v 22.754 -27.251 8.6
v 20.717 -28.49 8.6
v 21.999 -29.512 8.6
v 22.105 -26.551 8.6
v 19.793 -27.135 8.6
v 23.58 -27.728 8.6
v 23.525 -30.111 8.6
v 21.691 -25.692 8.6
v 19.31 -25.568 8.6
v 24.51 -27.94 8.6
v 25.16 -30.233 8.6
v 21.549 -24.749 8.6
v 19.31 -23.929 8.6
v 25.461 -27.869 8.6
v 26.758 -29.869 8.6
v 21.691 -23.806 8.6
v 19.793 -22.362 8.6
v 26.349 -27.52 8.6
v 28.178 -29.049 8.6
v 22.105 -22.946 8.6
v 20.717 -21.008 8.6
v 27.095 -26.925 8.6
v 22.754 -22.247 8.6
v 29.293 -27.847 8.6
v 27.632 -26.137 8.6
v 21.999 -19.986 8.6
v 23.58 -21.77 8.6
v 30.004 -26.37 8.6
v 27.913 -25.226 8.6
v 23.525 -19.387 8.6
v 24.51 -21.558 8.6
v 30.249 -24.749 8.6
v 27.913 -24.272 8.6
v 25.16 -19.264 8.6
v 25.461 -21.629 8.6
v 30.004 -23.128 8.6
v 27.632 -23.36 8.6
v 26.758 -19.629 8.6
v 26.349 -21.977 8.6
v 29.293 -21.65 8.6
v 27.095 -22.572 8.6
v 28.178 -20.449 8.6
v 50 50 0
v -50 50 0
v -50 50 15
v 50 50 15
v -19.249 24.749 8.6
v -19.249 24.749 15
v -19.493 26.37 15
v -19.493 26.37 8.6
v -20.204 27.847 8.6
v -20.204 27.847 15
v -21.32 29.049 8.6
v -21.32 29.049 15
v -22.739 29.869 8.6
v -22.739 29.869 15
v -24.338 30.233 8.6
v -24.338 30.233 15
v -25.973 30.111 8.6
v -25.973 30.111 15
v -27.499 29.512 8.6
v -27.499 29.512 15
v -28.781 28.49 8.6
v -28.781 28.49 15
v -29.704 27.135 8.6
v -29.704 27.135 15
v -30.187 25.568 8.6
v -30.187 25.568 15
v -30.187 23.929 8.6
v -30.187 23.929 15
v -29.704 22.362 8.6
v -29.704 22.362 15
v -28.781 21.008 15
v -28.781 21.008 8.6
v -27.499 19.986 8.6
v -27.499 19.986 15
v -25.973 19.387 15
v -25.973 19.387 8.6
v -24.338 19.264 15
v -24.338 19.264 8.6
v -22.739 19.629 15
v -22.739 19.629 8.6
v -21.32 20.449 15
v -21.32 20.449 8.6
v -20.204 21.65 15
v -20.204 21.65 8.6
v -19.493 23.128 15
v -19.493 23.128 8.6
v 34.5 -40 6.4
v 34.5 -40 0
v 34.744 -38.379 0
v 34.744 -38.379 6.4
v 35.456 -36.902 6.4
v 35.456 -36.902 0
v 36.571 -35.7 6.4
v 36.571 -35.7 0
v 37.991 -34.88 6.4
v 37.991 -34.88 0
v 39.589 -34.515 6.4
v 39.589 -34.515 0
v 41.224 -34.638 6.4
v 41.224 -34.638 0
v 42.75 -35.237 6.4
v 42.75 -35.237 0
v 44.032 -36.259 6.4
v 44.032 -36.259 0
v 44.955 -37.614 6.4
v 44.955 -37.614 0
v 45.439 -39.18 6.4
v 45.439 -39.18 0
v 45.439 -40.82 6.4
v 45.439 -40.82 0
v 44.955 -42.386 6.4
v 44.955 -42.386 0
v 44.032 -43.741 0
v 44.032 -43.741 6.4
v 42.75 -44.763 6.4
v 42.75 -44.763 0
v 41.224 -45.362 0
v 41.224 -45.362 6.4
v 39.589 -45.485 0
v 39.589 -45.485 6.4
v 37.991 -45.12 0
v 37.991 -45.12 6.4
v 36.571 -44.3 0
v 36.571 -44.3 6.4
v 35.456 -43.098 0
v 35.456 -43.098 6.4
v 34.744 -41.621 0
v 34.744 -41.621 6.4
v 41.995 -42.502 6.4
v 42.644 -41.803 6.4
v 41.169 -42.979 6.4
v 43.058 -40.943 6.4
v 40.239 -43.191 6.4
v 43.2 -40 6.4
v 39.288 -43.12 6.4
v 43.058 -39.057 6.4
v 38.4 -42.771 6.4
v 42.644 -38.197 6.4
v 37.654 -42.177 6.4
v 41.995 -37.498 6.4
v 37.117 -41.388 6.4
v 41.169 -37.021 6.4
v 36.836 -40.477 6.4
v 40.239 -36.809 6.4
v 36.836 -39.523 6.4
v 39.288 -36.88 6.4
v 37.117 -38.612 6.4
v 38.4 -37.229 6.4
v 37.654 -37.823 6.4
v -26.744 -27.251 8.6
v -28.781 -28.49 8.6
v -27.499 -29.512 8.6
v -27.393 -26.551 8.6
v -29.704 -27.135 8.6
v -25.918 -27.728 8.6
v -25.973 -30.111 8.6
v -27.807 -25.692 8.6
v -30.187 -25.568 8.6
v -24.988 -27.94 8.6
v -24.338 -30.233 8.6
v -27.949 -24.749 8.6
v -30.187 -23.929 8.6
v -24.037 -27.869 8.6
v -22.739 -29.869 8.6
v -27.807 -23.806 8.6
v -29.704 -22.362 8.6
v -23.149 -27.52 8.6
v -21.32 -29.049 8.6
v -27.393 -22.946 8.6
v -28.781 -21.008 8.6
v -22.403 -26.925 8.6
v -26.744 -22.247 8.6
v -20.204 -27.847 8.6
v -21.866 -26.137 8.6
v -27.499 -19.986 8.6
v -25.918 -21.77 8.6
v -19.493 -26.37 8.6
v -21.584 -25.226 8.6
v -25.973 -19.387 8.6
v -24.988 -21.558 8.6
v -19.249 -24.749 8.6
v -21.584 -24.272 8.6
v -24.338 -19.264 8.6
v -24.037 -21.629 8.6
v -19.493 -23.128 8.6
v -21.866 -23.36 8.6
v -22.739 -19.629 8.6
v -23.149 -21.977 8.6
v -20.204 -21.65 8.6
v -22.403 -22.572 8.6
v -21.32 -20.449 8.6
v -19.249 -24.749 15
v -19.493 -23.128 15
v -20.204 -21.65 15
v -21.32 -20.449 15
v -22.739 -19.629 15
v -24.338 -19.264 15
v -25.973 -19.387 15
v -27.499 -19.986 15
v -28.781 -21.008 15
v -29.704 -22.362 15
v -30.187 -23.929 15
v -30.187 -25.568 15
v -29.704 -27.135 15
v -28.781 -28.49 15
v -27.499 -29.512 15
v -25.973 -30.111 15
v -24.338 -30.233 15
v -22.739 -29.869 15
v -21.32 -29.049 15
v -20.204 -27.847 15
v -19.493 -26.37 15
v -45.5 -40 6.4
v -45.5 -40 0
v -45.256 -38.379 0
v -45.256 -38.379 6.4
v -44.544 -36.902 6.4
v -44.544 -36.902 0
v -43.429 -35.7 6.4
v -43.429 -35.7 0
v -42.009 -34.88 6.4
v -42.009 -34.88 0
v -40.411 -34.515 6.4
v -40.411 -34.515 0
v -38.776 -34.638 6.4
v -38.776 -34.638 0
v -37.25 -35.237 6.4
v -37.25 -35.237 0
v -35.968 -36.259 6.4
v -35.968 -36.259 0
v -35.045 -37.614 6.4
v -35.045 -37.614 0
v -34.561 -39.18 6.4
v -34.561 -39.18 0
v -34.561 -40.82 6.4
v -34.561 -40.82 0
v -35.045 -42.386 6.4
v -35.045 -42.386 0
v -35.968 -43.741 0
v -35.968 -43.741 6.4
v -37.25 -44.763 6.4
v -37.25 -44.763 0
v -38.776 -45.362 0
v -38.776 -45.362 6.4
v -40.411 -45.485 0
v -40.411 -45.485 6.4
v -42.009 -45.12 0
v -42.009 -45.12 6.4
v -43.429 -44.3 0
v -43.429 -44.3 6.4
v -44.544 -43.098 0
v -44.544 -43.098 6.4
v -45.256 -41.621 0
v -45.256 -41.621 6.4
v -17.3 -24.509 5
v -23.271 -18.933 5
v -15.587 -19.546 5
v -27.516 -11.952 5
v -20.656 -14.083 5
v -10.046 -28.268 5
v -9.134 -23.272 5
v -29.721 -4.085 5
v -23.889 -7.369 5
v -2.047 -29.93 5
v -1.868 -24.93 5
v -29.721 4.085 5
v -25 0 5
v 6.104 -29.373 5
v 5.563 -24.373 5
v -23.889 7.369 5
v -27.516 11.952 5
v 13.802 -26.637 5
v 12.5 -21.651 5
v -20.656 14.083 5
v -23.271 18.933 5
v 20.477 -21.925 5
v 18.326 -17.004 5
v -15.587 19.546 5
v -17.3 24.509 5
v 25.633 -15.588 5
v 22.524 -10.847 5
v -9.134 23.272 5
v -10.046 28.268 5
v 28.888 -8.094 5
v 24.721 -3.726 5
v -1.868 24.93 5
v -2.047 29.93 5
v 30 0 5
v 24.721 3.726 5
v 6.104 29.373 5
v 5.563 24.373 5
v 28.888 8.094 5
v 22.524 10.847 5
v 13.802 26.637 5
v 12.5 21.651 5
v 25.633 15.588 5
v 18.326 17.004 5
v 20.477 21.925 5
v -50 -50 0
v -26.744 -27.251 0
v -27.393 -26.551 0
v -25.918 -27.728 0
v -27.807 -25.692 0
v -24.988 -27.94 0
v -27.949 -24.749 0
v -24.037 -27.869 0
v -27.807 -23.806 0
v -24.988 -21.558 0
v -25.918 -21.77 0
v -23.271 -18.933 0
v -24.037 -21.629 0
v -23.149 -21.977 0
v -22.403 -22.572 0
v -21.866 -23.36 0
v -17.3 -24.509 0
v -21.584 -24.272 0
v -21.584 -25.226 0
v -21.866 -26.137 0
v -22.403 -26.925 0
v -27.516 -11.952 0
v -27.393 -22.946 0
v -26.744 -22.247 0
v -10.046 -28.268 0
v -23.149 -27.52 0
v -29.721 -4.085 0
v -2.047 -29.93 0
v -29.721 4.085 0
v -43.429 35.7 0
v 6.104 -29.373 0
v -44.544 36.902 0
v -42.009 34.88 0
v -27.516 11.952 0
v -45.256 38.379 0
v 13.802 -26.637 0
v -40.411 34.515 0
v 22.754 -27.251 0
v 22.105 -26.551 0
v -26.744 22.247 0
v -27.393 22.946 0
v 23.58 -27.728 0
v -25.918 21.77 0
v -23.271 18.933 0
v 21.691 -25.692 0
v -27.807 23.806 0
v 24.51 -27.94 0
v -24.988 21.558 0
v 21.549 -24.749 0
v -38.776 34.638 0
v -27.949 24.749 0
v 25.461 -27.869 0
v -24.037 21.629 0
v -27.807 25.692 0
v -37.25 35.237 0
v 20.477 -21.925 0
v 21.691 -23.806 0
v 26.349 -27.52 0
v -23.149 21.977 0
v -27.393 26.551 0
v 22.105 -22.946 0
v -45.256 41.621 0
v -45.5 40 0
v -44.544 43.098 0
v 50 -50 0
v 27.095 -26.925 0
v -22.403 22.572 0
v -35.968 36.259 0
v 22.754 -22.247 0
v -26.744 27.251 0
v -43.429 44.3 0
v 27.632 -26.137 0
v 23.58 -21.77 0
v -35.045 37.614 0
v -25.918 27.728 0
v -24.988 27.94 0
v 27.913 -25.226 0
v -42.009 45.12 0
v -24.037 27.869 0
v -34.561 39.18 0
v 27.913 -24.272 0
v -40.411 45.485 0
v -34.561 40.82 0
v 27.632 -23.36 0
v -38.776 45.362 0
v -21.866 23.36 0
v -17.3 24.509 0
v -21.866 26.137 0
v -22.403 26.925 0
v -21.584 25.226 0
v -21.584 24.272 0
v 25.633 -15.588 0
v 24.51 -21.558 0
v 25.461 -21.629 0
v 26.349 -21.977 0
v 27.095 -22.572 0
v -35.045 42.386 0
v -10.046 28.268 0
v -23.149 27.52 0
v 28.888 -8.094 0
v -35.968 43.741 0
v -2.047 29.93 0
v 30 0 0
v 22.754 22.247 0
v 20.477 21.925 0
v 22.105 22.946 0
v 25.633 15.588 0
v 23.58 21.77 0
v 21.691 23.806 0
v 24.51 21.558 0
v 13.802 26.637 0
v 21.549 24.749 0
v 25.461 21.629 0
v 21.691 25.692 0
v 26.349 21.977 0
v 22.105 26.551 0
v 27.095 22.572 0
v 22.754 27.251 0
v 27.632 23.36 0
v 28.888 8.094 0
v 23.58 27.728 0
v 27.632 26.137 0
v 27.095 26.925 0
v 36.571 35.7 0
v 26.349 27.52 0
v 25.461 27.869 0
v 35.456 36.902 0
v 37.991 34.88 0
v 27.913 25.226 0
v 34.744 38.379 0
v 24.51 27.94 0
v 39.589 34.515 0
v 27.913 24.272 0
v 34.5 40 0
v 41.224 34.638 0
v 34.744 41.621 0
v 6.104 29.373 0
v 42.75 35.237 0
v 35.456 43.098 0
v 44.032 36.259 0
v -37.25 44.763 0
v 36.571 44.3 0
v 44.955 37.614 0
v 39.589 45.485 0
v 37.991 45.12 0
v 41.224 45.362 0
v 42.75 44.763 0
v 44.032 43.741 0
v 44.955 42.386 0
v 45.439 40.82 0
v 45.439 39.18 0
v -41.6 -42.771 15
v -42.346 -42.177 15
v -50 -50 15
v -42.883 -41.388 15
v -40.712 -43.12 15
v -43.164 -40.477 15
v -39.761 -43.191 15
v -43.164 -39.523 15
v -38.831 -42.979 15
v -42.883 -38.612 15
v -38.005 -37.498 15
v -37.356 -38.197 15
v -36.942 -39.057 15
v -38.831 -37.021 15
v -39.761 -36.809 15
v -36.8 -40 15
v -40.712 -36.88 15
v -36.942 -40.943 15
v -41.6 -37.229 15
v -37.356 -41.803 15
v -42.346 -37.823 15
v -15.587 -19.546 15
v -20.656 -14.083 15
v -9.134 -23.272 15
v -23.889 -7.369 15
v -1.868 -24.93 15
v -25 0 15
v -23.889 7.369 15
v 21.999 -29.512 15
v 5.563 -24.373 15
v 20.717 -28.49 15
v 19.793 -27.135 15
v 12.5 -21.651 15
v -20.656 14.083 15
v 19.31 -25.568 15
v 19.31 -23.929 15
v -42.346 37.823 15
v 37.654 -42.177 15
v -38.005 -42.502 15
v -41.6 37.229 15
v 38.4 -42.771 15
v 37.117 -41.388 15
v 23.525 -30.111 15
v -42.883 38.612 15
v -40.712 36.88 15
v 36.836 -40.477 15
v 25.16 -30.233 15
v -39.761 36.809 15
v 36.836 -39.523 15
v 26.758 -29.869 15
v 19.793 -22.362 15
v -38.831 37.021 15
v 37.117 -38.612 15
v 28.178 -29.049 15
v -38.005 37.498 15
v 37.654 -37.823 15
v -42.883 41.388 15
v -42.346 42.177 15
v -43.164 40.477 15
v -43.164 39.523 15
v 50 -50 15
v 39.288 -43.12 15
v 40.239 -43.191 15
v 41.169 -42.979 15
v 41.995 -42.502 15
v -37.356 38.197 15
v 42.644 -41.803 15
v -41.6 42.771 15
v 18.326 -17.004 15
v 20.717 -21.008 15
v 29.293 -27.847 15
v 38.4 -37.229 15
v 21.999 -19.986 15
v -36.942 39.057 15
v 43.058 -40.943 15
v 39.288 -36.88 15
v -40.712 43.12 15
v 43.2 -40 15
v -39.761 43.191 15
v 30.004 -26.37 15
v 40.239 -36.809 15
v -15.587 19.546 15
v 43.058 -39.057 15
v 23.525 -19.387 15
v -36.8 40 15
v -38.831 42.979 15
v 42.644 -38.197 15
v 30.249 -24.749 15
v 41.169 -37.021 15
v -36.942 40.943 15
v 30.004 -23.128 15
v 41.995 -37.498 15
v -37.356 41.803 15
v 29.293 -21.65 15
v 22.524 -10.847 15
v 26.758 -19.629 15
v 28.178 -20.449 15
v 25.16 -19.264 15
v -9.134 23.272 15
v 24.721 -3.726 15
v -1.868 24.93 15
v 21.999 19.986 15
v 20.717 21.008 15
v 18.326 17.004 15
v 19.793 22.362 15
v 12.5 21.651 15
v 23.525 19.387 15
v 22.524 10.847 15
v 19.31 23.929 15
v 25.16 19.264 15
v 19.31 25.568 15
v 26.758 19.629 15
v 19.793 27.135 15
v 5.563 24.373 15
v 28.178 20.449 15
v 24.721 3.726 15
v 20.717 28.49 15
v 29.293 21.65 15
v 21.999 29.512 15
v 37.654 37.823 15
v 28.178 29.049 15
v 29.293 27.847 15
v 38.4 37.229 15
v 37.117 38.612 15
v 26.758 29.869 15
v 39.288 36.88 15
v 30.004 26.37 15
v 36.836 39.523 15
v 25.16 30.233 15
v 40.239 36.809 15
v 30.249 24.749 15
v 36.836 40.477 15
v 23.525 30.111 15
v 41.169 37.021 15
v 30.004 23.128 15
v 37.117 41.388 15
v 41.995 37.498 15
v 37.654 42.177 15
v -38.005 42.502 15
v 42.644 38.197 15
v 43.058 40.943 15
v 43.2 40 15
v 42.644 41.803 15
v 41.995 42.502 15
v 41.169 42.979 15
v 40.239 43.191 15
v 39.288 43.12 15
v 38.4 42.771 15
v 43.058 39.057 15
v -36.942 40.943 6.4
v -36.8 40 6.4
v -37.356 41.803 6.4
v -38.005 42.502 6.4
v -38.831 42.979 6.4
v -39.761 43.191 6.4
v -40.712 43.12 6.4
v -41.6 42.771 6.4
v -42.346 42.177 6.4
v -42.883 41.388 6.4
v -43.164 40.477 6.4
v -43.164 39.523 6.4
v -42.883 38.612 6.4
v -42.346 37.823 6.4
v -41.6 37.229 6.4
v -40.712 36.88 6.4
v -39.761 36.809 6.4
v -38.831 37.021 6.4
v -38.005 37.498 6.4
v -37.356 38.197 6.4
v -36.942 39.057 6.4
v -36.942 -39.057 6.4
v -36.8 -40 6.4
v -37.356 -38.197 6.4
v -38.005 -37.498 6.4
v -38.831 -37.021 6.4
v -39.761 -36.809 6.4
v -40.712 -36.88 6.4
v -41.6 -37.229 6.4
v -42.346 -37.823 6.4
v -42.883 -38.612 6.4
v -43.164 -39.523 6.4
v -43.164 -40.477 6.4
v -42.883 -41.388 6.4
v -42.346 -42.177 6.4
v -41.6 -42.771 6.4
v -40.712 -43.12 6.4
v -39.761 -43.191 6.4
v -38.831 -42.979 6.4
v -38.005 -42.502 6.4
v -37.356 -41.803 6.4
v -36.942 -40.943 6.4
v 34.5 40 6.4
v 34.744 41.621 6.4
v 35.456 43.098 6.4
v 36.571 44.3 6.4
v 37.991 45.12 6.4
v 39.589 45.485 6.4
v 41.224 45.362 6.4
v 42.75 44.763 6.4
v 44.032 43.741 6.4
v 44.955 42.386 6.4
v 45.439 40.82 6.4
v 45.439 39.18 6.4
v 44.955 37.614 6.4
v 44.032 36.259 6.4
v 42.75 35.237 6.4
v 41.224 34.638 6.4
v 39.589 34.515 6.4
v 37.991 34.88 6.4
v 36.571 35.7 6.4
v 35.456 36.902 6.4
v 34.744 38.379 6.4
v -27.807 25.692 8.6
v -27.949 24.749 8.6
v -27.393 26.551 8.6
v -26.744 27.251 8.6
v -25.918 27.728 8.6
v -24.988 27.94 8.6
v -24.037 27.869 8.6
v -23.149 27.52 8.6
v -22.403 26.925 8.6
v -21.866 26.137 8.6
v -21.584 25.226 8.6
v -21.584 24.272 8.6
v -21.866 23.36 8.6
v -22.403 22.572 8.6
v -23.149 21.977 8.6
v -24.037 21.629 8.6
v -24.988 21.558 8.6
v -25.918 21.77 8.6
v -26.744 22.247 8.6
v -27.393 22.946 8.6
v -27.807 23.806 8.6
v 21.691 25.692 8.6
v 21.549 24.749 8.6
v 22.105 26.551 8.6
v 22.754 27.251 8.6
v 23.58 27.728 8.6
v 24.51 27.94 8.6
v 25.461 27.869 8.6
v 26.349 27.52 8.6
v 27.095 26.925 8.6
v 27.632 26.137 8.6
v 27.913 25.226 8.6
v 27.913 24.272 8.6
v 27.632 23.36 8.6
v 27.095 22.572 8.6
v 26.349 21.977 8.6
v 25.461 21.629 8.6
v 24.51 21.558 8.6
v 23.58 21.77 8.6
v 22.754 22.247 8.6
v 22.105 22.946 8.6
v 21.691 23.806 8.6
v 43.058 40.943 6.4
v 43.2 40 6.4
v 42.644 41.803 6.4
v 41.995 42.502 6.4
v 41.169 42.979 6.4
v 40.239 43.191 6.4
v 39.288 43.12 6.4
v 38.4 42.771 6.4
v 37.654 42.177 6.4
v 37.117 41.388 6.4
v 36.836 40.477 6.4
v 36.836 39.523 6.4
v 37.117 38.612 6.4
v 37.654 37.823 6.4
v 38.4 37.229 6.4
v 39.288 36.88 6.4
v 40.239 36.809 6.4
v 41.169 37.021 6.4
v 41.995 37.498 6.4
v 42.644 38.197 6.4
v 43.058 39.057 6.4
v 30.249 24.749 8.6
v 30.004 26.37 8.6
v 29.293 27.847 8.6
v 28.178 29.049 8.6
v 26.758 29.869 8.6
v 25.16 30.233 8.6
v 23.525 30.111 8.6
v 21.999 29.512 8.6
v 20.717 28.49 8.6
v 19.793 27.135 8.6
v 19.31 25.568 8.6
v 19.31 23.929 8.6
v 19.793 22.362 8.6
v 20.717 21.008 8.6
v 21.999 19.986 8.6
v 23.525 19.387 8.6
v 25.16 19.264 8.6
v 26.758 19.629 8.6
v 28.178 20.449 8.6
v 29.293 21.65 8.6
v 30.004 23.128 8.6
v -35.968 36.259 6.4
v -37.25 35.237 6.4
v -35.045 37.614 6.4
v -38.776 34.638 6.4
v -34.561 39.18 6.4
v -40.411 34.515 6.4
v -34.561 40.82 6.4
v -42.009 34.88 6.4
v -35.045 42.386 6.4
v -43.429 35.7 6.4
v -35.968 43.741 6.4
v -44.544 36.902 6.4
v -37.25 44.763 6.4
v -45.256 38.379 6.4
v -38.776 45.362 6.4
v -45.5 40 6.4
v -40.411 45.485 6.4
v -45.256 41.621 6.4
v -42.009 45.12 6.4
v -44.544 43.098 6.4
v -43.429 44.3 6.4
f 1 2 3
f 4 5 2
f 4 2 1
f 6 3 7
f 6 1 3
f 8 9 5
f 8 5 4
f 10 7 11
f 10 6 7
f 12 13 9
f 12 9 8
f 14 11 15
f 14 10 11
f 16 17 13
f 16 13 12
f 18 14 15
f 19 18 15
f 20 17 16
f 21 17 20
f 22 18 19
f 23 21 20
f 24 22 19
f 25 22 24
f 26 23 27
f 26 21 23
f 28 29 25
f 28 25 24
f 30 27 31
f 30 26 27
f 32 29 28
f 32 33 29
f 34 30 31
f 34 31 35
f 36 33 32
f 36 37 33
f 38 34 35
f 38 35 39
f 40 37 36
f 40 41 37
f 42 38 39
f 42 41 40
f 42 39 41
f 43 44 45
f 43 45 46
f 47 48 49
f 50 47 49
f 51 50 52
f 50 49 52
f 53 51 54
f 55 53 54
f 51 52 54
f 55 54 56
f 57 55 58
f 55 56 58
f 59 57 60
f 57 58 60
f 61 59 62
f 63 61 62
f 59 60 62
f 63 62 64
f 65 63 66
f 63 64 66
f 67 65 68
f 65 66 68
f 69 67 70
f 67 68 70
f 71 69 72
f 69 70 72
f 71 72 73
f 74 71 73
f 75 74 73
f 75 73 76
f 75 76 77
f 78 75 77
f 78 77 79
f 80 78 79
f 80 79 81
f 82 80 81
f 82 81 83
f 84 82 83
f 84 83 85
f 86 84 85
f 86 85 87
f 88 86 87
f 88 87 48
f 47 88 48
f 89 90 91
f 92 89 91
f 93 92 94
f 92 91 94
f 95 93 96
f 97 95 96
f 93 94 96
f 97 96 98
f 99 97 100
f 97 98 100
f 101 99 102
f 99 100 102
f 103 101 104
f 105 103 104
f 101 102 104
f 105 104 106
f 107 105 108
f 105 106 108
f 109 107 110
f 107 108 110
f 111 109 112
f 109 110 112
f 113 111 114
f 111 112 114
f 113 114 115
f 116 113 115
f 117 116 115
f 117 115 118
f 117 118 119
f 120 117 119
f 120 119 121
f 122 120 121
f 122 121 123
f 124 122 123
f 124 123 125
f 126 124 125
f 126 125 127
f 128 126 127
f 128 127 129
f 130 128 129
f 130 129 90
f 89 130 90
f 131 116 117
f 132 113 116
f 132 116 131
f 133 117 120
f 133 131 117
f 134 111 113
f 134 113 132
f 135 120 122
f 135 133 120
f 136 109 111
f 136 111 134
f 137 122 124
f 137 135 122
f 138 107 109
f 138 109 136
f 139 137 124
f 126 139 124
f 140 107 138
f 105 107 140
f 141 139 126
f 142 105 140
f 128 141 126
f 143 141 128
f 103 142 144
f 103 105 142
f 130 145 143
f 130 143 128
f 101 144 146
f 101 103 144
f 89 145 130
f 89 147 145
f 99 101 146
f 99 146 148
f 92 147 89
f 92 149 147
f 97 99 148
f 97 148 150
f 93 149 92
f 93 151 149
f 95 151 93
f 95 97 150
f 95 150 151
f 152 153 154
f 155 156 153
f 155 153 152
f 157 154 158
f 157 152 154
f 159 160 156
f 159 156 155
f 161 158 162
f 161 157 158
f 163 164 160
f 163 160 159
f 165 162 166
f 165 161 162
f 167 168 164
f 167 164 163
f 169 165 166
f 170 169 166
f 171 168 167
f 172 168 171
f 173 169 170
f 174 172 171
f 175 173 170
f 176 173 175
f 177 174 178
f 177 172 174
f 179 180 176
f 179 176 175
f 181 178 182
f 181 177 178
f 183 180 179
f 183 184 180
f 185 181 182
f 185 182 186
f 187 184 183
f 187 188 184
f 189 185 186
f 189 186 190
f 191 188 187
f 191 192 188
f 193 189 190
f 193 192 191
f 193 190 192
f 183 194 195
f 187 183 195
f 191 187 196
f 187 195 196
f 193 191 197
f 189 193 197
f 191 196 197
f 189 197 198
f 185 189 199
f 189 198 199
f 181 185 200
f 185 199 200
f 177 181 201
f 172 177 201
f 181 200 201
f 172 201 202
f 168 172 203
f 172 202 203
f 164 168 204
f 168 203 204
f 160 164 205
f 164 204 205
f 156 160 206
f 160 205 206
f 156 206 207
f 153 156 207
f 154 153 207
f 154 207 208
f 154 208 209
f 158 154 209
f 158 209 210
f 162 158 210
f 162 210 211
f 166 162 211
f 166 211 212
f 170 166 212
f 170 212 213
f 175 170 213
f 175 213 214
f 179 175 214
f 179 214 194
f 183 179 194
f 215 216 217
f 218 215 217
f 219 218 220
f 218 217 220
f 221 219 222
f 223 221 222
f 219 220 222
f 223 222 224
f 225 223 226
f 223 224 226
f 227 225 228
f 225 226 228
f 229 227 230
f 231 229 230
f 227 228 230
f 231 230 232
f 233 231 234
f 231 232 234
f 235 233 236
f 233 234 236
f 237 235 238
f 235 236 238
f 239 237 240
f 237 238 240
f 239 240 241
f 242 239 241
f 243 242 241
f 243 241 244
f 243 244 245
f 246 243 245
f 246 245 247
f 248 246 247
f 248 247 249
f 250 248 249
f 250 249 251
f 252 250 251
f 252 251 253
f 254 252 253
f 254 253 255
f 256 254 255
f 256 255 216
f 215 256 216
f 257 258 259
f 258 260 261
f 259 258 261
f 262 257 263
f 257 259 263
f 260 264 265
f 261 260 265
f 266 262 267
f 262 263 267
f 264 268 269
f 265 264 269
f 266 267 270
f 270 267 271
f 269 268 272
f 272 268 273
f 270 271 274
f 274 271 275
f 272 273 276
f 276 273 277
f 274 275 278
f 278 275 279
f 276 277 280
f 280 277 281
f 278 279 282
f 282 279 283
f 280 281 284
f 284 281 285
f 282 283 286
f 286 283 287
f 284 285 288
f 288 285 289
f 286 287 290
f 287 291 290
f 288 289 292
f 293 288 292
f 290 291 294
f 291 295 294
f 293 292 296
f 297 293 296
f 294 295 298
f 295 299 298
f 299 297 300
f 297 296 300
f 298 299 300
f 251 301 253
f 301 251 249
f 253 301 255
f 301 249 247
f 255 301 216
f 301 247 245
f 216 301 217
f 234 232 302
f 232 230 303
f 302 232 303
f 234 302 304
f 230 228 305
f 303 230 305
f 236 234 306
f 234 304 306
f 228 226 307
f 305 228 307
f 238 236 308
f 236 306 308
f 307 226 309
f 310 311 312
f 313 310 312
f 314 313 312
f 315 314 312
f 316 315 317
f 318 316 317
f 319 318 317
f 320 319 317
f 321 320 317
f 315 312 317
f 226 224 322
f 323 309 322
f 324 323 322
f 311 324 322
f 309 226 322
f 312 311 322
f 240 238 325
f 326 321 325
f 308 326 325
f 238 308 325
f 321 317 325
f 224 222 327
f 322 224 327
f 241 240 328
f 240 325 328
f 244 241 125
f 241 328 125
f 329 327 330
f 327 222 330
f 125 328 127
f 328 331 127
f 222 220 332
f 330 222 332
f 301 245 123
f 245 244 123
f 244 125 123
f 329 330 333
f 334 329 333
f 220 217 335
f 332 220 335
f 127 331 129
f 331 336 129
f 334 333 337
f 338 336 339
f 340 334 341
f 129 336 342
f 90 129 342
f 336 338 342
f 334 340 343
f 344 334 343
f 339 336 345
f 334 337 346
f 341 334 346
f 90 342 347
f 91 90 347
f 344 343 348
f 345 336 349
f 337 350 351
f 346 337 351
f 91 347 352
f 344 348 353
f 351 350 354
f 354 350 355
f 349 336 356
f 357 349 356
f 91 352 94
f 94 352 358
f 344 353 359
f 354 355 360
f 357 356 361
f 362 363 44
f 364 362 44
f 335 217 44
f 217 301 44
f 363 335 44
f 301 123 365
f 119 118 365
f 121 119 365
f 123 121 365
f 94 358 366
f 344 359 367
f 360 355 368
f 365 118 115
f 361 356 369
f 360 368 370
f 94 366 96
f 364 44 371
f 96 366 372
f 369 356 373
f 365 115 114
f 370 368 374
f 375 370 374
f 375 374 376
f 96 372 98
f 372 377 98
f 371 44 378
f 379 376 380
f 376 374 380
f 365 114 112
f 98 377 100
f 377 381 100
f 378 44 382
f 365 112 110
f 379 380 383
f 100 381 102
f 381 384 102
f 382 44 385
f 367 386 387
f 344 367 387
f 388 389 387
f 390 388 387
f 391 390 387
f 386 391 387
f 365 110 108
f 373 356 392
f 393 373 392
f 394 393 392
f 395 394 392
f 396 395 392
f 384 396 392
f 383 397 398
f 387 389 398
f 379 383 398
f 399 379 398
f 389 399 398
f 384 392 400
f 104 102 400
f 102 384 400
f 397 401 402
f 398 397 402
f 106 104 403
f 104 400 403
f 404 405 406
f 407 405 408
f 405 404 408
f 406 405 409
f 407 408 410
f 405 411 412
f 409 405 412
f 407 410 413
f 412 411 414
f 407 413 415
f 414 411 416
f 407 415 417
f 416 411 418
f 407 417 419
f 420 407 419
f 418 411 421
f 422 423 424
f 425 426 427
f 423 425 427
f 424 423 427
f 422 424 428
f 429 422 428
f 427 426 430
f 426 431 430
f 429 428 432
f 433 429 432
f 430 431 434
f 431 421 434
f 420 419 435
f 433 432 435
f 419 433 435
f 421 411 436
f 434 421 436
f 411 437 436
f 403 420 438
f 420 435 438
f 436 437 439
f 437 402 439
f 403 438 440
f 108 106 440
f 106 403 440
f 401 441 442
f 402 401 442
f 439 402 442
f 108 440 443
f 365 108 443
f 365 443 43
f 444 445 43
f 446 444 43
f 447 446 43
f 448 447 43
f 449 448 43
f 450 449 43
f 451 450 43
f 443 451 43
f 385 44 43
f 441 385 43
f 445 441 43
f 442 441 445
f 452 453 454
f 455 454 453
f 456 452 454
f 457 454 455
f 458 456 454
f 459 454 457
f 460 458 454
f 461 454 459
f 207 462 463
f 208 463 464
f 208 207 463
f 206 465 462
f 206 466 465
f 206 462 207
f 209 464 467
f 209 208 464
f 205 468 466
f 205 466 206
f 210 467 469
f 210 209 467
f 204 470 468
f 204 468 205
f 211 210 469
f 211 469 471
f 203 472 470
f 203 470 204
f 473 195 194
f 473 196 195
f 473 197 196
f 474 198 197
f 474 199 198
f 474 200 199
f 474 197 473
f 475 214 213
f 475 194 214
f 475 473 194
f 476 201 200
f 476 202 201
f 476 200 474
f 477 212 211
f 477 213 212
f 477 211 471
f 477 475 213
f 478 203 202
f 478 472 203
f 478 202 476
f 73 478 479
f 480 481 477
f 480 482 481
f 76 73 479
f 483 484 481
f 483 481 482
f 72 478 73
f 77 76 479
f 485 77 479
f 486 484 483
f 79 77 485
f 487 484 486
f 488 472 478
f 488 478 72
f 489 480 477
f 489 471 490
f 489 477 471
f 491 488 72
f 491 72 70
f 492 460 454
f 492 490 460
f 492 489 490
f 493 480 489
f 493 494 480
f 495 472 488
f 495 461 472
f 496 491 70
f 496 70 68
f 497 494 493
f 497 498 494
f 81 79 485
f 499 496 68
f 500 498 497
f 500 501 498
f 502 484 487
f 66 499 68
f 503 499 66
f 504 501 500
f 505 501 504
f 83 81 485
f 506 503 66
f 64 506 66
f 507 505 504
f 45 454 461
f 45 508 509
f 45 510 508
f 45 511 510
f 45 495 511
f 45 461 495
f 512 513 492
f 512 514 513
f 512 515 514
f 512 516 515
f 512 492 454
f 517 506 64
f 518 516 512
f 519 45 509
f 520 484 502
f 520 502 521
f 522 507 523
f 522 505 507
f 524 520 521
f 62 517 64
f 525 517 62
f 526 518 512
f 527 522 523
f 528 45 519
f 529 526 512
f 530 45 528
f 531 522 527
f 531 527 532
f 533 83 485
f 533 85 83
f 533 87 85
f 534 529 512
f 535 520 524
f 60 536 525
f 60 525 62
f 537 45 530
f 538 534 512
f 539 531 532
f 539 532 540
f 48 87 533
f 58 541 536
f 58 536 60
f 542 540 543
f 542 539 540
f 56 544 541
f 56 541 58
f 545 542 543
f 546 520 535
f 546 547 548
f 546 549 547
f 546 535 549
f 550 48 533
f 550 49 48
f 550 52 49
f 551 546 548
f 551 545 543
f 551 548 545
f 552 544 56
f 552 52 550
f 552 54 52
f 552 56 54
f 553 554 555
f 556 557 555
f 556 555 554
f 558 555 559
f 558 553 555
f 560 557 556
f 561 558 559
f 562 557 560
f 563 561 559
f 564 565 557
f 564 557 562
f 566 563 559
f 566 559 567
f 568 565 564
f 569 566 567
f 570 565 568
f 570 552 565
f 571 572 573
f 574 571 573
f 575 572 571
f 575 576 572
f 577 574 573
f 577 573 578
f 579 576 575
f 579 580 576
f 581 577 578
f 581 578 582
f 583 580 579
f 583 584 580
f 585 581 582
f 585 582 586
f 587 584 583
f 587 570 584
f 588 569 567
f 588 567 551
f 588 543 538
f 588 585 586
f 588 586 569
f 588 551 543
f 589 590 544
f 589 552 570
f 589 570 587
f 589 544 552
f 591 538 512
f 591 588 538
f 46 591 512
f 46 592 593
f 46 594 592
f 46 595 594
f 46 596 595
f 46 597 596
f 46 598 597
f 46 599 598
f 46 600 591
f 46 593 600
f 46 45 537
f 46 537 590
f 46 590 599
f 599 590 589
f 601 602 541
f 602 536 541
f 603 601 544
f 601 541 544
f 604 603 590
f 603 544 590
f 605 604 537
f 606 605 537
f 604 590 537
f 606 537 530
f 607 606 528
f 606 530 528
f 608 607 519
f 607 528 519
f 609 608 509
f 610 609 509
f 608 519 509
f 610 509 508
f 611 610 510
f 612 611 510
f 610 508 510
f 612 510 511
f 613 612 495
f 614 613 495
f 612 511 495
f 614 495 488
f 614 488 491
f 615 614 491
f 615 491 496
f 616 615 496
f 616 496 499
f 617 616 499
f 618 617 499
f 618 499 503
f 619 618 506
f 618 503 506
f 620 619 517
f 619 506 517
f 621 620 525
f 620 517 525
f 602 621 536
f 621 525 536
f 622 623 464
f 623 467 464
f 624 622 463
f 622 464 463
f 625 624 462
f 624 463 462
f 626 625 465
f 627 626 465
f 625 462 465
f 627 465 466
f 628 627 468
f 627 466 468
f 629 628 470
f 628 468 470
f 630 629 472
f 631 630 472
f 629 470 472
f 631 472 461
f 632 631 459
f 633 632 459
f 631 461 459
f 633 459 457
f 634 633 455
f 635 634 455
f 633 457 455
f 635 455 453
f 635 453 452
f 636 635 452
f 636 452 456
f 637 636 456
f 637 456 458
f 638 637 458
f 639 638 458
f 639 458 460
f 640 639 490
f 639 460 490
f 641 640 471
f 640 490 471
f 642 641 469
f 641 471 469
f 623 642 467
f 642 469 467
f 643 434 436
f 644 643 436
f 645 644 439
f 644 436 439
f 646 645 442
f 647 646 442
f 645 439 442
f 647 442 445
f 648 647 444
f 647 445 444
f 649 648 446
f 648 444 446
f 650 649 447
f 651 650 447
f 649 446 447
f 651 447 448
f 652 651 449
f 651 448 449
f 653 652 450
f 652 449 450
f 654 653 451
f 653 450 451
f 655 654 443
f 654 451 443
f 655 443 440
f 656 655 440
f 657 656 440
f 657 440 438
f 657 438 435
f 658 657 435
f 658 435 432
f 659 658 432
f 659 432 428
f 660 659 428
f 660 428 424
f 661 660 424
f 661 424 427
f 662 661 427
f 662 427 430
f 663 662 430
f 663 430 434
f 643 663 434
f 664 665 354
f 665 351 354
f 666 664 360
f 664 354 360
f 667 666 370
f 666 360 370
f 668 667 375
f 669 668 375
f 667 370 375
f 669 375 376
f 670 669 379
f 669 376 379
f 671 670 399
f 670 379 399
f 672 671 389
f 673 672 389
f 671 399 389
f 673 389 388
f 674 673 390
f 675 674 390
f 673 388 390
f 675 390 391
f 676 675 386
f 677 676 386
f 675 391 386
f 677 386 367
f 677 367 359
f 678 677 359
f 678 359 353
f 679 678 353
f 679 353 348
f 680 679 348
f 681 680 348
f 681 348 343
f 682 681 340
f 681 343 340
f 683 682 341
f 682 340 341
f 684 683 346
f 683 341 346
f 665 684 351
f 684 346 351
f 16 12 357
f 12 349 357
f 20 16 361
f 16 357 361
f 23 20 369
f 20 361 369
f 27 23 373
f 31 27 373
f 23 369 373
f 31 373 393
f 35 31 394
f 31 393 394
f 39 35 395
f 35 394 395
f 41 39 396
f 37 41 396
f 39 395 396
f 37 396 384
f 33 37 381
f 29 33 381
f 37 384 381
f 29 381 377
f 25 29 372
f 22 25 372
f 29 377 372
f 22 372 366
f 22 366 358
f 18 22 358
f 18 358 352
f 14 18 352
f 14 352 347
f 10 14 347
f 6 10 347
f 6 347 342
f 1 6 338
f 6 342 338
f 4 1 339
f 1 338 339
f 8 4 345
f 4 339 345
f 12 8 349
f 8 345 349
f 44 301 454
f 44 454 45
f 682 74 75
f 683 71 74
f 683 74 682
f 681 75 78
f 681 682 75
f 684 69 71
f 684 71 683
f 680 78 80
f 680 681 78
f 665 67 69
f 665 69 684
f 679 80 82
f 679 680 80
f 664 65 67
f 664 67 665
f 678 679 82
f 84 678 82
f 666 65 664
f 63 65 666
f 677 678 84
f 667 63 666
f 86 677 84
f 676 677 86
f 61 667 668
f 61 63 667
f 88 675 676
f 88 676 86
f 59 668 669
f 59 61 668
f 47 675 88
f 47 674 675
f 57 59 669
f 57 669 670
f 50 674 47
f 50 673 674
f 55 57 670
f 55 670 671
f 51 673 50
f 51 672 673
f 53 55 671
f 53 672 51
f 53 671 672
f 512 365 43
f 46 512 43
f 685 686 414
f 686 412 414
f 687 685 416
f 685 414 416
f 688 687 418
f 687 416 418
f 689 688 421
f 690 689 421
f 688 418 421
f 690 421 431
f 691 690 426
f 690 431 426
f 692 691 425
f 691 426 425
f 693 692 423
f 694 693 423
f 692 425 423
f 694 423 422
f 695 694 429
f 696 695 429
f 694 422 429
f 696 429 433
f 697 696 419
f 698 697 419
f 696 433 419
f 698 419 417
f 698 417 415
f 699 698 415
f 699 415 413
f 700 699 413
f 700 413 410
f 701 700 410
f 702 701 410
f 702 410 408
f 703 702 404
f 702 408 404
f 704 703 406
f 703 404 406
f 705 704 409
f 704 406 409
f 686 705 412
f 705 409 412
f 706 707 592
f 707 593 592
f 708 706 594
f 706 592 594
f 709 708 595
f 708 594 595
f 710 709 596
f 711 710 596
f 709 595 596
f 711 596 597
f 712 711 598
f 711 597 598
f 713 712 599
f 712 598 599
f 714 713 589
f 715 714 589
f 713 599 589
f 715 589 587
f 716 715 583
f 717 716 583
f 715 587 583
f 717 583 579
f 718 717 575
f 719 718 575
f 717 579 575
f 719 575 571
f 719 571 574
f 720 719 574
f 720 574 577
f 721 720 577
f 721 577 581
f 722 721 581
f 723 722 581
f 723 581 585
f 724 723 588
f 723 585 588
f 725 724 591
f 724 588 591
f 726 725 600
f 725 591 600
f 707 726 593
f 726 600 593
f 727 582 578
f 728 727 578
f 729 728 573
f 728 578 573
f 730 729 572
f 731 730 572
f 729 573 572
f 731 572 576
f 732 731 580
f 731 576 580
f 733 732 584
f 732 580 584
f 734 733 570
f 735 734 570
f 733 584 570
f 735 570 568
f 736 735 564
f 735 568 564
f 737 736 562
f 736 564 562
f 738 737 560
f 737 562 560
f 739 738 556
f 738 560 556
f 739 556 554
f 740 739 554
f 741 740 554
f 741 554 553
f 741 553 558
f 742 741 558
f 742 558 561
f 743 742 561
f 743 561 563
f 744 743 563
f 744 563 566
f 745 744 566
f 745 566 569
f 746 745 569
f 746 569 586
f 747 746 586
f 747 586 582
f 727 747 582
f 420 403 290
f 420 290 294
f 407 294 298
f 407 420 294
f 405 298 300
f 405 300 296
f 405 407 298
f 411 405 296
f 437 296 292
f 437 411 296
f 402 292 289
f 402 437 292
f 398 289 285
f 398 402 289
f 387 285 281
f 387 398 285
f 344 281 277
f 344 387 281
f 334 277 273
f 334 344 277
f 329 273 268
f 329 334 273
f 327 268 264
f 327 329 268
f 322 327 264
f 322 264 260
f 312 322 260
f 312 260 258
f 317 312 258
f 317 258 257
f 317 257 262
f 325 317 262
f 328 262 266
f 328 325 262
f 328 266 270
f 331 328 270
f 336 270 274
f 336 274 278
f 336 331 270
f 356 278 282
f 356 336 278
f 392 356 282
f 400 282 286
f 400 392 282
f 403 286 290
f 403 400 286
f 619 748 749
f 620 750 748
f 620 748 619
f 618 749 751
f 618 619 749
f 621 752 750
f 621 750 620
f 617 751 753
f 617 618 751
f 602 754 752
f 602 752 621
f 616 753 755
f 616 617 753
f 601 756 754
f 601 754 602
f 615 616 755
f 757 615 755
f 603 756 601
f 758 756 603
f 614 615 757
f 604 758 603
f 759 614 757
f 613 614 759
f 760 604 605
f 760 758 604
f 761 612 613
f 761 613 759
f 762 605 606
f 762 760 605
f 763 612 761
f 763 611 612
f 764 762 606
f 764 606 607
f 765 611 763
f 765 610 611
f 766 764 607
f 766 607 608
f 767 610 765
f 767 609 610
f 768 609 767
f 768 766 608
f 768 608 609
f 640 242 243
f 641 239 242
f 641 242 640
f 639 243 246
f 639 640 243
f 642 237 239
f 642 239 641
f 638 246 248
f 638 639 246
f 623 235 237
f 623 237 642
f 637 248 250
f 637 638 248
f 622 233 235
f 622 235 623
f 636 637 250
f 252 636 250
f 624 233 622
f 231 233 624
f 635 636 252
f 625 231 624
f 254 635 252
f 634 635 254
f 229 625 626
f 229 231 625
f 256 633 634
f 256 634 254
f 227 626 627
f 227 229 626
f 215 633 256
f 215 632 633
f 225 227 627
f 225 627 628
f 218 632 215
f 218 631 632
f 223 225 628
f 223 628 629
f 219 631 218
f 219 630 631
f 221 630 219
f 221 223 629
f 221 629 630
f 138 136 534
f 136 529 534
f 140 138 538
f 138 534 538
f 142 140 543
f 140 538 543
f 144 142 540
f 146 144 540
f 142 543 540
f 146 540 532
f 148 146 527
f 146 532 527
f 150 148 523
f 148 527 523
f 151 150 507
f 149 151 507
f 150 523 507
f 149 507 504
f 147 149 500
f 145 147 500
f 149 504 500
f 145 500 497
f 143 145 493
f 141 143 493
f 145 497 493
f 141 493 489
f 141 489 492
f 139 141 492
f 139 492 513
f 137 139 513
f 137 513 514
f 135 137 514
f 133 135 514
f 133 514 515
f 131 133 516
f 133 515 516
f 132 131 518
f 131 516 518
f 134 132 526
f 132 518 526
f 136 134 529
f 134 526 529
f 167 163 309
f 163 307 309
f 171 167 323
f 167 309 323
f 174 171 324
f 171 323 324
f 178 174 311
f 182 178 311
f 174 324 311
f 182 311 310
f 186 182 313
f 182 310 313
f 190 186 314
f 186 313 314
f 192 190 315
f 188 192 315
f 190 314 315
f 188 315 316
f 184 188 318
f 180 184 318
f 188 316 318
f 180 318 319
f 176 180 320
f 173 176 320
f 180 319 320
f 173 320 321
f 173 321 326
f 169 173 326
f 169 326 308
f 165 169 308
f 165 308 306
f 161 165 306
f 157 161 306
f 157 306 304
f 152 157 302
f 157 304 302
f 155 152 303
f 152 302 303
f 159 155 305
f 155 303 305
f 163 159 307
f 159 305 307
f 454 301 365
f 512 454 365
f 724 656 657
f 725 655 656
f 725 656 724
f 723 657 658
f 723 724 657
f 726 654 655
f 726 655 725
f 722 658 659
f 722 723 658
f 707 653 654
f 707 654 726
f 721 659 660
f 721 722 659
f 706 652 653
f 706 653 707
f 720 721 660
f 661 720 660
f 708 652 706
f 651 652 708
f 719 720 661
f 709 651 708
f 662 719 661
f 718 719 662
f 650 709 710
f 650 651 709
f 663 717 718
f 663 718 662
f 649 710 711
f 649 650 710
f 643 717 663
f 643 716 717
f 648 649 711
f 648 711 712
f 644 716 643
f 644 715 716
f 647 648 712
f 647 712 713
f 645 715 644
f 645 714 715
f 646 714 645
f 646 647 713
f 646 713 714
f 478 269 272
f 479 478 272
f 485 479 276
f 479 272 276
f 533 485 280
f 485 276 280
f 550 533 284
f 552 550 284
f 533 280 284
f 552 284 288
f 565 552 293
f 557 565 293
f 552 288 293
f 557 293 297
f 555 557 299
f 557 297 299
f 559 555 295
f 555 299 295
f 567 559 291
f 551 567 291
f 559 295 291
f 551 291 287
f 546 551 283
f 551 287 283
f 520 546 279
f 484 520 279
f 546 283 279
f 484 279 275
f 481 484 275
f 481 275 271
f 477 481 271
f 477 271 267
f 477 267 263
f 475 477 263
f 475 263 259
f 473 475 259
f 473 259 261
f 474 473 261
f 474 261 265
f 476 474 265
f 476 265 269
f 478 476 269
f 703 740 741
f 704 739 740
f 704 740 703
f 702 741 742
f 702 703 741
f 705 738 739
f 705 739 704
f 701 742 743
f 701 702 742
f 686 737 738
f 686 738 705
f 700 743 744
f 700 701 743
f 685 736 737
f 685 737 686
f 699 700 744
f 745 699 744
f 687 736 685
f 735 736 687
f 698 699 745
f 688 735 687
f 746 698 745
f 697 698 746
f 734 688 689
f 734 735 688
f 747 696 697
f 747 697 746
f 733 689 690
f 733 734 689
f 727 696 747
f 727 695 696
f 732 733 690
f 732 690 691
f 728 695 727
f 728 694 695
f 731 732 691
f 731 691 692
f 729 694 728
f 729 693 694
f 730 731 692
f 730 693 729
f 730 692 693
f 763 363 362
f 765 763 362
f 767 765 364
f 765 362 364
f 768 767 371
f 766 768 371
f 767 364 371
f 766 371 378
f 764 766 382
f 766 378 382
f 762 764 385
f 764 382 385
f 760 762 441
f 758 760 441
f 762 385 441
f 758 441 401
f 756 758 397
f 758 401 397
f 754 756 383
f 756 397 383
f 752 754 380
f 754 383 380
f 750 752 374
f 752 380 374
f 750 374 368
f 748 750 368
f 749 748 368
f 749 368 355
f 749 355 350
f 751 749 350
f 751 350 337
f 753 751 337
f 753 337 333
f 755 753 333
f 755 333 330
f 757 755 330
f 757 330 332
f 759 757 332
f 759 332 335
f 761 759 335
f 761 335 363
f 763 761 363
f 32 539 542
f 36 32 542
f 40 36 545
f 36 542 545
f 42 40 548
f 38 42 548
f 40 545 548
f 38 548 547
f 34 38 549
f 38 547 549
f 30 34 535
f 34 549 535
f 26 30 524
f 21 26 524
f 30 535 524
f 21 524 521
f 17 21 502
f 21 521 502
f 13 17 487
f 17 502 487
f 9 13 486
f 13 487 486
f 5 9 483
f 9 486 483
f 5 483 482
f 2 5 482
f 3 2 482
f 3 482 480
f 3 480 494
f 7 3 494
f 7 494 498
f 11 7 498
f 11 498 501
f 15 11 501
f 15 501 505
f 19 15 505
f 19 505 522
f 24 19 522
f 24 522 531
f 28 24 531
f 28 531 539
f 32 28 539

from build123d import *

# Parameters (mm, degrees)
SKETCH_1_W                   = 100
SKETCH_1_H                   = 100
EXTRUDE_1_DEPTH              = 15
HOLE_WIZARD_M6_1_D           = 6.4
HOLE_WIZARD_M6_1_CBORE_D     = 11
HOLE_WIZARD_M6_1_CBORE_DEPTH = 6.4
SKETCH_4_R                   = 30
CUT_EXTRUDE_1_DEPTH          = 5
HOLE_WIZARD_M6_2_D           = 6.4
HOLE_WIZARD_M6_2_CBORE_D     = 11
HOLE_WIZARD_M6_2_CBORE_DEPTH = 6.4
SKETCH_8_R                   = 25
CUT_EXTRUDE_2_DEPTH          = 11


with BuildPart() as part:
    # 草图1 → 凸台-拉伸1 (new body)
    with BuildSketch(Plane.XY):
        Rectangle(SKETCH_1_W, SKETCH_1_H)
    extrude(amount=EXTRUDE_1_DEPTH)

    # M6 六角凹头螺钉的柱形沉头孔1 (through all)
    with Locations(Plane(origin=(-40, 40, 0), x_dir=(-1, 0, 0), z_dir=(0, 0, -1))):
        with Locations((0, 0), (-80, 0), (-80, -80), (0, -80)):
            CounterBoreHole(HOLE_WIZARD_M6_1_D / 2, HOLE_WIZARD_M6_1_CBORE_D / 2, HOLE_WIZARD_M6_1_CBORE_DEPTH)

    # 草图4 → 切除-拉伸1 (cut)
    with BuildSketch(Plane.XY):
        Circle(SKETCH_4_R)
    extrude(amount=CUT_EXTRUDE_1_DEPTH, mode=Mode.SUBTRACT)

    # M6 六角凹头螺钉的柱形沉头孔2 (through all)
    with Locations(Plane(origin=(-24.748737342, 24.748737342, 15), x_dir=(1, 0, 0), z_dir=(0, 0, 1))):
        with Locations((0, 0), (0, -49.497474684), (49.497474684, -49.497474684), (49.497474684, 0)):
            CounterBoreHole(HOLE_WIZARD_M6_2_D / 2, HOLE_WIZARD_M6_2_CBORE_D / 2, HOLE_WIZARD_M6_2_CBORE_DEPTH)

    # 草图8 → 切除-拉伸2 (cut, through all)
    with BuildSketch(Plane(origin=(0, 0, 5), x_dir=(-1, 0, 0), z_dir=(0, 0, -1))):
        Circle(SKETCH_8_R)
    extrude(amount=-CUT_EXTRUDE_2_DEPTH, mode=Mode.SUBTRACT)


solid = part.part
